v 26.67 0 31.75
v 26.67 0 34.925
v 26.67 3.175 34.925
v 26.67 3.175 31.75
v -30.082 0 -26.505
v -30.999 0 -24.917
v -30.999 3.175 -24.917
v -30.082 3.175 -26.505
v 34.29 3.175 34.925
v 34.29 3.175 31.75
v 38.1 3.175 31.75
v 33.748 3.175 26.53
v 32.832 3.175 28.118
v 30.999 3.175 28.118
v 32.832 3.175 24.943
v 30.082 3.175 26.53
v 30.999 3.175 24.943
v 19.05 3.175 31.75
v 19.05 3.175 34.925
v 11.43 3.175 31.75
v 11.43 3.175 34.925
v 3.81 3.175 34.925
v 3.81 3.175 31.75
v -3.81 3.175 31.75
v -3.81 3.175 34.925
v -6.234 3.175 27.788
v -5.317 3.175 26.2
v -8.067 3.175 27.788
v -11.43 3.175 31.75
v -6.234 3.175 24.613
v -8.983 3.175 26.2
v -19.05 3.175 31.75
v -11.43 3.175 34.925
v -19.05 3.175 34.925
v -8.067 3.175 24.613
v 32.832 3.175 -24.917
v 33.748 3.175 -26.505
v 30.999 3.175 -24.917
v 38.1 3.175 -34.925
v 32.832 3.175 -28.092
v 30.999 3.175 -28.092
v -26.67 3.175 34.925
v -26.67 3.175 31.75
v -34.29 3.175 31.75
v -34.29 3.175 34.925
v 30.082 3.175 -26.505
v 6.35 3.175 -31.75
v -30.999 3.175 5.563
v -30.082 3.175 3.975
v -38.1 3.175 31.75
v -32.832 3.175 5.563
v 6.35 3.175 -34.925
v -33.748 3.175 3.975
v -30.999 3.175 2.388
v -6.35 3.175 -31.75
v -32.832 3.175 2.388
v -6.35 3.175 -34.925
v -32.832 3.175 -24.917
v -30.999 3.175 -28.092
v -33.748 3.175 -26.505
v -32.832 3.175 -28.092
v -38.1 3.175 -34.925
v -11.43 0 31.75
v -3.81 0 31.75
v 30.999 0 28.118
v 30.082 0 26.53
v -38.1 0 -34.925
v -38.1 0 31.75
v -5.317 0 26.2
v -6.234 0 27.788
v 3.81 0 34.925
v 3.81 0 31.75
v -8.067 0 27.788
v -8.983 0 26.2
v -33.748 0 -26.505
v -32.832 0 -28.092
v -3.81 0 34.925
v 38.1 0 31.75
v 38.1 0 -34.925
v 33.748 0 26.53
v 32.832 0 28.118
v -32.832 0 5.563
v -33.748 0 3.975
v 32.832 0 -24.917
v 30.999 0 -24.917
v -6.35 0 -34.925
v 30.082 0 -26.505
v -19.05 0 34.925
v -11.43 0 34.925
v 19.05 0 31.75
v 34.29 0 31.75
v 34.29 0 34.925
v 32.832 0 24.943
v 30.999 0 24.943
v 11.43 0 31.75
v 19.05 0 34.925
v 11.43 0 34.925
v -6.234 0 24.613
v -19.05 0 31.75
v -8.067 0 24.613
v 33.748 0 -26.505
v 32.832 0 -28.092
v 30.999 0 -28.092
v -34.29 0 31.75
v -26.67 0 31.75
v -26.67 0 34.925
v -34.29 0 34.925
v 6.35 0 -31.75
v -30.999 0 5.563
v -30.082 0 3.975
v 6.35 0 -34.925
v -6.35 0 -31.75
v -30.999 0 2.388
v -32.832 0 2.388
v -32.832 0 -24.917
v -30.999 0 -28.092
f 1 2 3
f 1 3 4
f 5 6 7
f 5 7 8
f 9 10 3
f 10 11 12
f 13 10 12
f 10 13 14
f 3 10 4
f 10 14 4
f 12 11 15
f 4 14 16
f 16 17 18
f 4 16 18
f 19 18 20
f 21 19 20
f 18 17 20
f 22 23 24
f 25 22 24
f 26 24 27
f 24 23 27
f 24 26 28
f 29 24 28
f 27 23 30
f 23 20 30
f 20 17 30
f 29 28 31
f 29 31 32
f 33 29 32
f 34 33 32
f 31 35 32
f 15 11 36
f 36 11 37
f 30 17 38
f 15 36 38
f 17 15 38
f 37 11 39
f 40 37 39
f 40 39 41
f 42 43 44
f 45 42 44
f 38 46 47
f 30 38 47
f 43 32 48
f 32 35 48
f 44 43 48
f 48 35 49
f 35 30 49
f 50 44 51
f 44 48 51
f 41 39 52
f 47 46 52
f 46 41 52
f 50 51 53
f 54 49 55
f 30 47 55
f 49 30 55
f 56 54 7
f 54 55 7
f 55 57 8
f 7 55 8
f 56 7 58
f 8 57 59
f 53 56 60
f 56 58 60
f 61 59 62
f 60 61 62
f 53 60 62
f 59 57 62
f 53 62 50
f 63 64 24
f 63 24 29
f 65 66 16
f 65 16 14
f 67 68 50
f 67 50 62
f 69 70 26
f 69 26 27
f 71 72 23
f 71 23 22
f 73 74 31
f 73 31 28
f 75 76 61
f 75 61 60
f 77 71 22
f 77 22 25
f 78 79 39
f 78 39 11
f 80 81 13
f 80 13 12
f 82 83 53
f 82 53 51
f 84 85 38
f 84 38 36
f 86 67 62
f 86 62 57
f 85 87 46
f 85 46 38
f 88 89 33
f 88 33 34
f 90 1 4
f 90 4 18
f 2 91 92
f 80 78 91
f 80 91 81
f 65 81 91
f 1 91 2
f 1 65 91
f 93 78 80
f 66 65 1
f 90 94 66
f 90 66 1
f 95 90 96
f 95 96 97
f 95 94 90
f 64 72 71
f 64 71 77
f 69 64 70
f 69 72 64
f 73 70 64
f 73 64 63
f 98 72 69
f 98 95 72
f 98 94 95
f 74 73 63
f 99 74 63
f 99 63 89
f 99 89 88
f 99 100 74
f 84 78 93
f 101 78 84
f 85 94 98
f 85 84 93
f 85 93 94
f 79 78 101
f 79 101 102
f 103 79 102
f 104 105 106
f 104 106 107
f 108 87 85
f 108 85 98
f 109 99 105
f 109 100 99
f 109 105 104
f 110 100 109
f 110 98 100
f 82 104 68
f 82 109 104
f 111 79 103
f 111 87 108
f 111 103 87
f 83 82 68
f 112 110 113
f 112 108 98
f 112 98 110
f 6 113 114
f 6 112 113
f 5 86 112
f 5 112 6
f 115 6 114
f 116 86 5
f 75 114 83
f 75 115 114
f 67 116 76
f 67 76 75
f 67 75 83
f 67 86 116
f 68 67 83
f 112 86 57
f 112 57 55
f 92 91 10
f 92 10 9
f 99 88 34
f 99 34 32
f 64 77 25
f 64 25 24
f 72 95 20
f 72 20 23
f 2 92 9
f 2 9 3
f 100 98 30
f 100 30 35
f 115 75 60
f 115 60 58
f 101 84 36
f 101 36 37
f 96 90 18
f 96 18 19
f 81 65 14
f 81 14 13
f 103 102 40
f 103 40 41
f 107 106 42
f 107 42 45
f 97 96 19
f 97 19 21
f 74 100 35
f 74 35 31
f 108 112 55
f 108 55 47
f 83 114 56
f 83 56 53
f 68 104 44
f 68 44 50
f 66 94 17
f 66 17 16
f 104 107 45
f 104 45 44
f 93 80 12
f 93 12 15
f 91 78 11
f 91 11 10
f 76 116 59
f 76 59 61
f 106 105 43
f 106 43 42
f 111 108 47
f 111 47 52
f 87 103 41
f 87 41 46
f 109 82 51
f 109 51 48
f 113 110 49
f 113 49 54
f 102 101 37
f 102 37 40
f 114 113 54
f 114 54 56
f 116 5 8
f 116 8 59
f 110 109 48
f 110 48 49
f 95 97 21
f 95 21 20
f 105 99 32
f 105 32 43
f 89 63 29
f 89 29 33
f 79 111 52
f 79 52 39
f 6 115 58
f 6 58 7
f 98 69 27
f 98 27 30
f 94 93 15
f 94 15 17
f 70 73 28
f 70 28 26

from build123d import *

# Parameters (mm, degrees)
BOSS_EXTRUDE2_DEPTH = 3.175


with BuildPart() as part:
    # Sketch1 → Boss-Extrude2 (new body)
    with BuildSketch(Plane(origin=(0, 0, 0), x_dir=(1, 0, 0), z_dir=(0, 1, 0))):
        Polygon((-19.05, -34.925), (-19.05, -31.75), (-26.67, -31.75), (-26.67, -34.925), (-34.29, -34.925), (-34.29, -31.75), (-38.1, -31.75), (-38.1, 34.925), (-6.35, 34.925), (-6.35, 31.75), (6.35, 31.75), (6.35, 34.925), (38.1, 34.925), (38.1, -31.75), (34.29, -31.75), (34.29, -34.925), (26.67, -34.925), (26.67, -31.75), (19.05, -31.75), (19.05, -34.925), (11.43, -34.925), (11.43, -31.75), (3.81, -31.75), (3.81, -34.925), (-3.81, -34.925), (-3.81, -31.75), (-11.43, -31.75), (-11.43, -34.925), align=None)
        Polygon((-30.998556448, -5.5626), (-30.082012895, -3.9751), (-30.998556448, -2.3876), (-32.831643552, -2.3876), (-33.748187105, -3.9751), (-32.831643552, -5.5626), align=None, mode=Mode.SUBTRACT)
        Polygon((-30.082012895, 26.5049), (-30.998556448, 28.0924), (-32.831643552, 28.0924), (-33.748187105, 26.5049), (-32.831643552, 24.9174), (-30.998556448, 24.9174), align=None, mode=Mode.SUBTRACT)
        Polygon((32.831643552, 24.9174), (33.748187105, 26.5049), (32.831643552, 28.0924), (30.998556448, 28.0924), (30.082012895, 26.5049), (30.998556448, 24.9174), align=None, mode=Mode.SUBTRACT)
        Polygon((-6.233556448, -27.7876), (-5.317012895, -26.2001), (-6.233556448, -24.6126), (-8.066643552, -24.6126), (-8.983187105, -26.2001), (-8.066643552, -27.7876), align=None, mode=Mode.SUBTRACT)
        Polygon((33.748187105, -26.5303), (32.831643552, -24.9428), (30.998556448, -24.9428), (30.082012895, -26.5303), (30.998556448, -28.1178), (32.831643552, -28.1178), align=None, mode=Mode.SUBTRACT)
    extrude(amount=BOSS_EXTRUDE2_DEPTH)


solid = part.part
